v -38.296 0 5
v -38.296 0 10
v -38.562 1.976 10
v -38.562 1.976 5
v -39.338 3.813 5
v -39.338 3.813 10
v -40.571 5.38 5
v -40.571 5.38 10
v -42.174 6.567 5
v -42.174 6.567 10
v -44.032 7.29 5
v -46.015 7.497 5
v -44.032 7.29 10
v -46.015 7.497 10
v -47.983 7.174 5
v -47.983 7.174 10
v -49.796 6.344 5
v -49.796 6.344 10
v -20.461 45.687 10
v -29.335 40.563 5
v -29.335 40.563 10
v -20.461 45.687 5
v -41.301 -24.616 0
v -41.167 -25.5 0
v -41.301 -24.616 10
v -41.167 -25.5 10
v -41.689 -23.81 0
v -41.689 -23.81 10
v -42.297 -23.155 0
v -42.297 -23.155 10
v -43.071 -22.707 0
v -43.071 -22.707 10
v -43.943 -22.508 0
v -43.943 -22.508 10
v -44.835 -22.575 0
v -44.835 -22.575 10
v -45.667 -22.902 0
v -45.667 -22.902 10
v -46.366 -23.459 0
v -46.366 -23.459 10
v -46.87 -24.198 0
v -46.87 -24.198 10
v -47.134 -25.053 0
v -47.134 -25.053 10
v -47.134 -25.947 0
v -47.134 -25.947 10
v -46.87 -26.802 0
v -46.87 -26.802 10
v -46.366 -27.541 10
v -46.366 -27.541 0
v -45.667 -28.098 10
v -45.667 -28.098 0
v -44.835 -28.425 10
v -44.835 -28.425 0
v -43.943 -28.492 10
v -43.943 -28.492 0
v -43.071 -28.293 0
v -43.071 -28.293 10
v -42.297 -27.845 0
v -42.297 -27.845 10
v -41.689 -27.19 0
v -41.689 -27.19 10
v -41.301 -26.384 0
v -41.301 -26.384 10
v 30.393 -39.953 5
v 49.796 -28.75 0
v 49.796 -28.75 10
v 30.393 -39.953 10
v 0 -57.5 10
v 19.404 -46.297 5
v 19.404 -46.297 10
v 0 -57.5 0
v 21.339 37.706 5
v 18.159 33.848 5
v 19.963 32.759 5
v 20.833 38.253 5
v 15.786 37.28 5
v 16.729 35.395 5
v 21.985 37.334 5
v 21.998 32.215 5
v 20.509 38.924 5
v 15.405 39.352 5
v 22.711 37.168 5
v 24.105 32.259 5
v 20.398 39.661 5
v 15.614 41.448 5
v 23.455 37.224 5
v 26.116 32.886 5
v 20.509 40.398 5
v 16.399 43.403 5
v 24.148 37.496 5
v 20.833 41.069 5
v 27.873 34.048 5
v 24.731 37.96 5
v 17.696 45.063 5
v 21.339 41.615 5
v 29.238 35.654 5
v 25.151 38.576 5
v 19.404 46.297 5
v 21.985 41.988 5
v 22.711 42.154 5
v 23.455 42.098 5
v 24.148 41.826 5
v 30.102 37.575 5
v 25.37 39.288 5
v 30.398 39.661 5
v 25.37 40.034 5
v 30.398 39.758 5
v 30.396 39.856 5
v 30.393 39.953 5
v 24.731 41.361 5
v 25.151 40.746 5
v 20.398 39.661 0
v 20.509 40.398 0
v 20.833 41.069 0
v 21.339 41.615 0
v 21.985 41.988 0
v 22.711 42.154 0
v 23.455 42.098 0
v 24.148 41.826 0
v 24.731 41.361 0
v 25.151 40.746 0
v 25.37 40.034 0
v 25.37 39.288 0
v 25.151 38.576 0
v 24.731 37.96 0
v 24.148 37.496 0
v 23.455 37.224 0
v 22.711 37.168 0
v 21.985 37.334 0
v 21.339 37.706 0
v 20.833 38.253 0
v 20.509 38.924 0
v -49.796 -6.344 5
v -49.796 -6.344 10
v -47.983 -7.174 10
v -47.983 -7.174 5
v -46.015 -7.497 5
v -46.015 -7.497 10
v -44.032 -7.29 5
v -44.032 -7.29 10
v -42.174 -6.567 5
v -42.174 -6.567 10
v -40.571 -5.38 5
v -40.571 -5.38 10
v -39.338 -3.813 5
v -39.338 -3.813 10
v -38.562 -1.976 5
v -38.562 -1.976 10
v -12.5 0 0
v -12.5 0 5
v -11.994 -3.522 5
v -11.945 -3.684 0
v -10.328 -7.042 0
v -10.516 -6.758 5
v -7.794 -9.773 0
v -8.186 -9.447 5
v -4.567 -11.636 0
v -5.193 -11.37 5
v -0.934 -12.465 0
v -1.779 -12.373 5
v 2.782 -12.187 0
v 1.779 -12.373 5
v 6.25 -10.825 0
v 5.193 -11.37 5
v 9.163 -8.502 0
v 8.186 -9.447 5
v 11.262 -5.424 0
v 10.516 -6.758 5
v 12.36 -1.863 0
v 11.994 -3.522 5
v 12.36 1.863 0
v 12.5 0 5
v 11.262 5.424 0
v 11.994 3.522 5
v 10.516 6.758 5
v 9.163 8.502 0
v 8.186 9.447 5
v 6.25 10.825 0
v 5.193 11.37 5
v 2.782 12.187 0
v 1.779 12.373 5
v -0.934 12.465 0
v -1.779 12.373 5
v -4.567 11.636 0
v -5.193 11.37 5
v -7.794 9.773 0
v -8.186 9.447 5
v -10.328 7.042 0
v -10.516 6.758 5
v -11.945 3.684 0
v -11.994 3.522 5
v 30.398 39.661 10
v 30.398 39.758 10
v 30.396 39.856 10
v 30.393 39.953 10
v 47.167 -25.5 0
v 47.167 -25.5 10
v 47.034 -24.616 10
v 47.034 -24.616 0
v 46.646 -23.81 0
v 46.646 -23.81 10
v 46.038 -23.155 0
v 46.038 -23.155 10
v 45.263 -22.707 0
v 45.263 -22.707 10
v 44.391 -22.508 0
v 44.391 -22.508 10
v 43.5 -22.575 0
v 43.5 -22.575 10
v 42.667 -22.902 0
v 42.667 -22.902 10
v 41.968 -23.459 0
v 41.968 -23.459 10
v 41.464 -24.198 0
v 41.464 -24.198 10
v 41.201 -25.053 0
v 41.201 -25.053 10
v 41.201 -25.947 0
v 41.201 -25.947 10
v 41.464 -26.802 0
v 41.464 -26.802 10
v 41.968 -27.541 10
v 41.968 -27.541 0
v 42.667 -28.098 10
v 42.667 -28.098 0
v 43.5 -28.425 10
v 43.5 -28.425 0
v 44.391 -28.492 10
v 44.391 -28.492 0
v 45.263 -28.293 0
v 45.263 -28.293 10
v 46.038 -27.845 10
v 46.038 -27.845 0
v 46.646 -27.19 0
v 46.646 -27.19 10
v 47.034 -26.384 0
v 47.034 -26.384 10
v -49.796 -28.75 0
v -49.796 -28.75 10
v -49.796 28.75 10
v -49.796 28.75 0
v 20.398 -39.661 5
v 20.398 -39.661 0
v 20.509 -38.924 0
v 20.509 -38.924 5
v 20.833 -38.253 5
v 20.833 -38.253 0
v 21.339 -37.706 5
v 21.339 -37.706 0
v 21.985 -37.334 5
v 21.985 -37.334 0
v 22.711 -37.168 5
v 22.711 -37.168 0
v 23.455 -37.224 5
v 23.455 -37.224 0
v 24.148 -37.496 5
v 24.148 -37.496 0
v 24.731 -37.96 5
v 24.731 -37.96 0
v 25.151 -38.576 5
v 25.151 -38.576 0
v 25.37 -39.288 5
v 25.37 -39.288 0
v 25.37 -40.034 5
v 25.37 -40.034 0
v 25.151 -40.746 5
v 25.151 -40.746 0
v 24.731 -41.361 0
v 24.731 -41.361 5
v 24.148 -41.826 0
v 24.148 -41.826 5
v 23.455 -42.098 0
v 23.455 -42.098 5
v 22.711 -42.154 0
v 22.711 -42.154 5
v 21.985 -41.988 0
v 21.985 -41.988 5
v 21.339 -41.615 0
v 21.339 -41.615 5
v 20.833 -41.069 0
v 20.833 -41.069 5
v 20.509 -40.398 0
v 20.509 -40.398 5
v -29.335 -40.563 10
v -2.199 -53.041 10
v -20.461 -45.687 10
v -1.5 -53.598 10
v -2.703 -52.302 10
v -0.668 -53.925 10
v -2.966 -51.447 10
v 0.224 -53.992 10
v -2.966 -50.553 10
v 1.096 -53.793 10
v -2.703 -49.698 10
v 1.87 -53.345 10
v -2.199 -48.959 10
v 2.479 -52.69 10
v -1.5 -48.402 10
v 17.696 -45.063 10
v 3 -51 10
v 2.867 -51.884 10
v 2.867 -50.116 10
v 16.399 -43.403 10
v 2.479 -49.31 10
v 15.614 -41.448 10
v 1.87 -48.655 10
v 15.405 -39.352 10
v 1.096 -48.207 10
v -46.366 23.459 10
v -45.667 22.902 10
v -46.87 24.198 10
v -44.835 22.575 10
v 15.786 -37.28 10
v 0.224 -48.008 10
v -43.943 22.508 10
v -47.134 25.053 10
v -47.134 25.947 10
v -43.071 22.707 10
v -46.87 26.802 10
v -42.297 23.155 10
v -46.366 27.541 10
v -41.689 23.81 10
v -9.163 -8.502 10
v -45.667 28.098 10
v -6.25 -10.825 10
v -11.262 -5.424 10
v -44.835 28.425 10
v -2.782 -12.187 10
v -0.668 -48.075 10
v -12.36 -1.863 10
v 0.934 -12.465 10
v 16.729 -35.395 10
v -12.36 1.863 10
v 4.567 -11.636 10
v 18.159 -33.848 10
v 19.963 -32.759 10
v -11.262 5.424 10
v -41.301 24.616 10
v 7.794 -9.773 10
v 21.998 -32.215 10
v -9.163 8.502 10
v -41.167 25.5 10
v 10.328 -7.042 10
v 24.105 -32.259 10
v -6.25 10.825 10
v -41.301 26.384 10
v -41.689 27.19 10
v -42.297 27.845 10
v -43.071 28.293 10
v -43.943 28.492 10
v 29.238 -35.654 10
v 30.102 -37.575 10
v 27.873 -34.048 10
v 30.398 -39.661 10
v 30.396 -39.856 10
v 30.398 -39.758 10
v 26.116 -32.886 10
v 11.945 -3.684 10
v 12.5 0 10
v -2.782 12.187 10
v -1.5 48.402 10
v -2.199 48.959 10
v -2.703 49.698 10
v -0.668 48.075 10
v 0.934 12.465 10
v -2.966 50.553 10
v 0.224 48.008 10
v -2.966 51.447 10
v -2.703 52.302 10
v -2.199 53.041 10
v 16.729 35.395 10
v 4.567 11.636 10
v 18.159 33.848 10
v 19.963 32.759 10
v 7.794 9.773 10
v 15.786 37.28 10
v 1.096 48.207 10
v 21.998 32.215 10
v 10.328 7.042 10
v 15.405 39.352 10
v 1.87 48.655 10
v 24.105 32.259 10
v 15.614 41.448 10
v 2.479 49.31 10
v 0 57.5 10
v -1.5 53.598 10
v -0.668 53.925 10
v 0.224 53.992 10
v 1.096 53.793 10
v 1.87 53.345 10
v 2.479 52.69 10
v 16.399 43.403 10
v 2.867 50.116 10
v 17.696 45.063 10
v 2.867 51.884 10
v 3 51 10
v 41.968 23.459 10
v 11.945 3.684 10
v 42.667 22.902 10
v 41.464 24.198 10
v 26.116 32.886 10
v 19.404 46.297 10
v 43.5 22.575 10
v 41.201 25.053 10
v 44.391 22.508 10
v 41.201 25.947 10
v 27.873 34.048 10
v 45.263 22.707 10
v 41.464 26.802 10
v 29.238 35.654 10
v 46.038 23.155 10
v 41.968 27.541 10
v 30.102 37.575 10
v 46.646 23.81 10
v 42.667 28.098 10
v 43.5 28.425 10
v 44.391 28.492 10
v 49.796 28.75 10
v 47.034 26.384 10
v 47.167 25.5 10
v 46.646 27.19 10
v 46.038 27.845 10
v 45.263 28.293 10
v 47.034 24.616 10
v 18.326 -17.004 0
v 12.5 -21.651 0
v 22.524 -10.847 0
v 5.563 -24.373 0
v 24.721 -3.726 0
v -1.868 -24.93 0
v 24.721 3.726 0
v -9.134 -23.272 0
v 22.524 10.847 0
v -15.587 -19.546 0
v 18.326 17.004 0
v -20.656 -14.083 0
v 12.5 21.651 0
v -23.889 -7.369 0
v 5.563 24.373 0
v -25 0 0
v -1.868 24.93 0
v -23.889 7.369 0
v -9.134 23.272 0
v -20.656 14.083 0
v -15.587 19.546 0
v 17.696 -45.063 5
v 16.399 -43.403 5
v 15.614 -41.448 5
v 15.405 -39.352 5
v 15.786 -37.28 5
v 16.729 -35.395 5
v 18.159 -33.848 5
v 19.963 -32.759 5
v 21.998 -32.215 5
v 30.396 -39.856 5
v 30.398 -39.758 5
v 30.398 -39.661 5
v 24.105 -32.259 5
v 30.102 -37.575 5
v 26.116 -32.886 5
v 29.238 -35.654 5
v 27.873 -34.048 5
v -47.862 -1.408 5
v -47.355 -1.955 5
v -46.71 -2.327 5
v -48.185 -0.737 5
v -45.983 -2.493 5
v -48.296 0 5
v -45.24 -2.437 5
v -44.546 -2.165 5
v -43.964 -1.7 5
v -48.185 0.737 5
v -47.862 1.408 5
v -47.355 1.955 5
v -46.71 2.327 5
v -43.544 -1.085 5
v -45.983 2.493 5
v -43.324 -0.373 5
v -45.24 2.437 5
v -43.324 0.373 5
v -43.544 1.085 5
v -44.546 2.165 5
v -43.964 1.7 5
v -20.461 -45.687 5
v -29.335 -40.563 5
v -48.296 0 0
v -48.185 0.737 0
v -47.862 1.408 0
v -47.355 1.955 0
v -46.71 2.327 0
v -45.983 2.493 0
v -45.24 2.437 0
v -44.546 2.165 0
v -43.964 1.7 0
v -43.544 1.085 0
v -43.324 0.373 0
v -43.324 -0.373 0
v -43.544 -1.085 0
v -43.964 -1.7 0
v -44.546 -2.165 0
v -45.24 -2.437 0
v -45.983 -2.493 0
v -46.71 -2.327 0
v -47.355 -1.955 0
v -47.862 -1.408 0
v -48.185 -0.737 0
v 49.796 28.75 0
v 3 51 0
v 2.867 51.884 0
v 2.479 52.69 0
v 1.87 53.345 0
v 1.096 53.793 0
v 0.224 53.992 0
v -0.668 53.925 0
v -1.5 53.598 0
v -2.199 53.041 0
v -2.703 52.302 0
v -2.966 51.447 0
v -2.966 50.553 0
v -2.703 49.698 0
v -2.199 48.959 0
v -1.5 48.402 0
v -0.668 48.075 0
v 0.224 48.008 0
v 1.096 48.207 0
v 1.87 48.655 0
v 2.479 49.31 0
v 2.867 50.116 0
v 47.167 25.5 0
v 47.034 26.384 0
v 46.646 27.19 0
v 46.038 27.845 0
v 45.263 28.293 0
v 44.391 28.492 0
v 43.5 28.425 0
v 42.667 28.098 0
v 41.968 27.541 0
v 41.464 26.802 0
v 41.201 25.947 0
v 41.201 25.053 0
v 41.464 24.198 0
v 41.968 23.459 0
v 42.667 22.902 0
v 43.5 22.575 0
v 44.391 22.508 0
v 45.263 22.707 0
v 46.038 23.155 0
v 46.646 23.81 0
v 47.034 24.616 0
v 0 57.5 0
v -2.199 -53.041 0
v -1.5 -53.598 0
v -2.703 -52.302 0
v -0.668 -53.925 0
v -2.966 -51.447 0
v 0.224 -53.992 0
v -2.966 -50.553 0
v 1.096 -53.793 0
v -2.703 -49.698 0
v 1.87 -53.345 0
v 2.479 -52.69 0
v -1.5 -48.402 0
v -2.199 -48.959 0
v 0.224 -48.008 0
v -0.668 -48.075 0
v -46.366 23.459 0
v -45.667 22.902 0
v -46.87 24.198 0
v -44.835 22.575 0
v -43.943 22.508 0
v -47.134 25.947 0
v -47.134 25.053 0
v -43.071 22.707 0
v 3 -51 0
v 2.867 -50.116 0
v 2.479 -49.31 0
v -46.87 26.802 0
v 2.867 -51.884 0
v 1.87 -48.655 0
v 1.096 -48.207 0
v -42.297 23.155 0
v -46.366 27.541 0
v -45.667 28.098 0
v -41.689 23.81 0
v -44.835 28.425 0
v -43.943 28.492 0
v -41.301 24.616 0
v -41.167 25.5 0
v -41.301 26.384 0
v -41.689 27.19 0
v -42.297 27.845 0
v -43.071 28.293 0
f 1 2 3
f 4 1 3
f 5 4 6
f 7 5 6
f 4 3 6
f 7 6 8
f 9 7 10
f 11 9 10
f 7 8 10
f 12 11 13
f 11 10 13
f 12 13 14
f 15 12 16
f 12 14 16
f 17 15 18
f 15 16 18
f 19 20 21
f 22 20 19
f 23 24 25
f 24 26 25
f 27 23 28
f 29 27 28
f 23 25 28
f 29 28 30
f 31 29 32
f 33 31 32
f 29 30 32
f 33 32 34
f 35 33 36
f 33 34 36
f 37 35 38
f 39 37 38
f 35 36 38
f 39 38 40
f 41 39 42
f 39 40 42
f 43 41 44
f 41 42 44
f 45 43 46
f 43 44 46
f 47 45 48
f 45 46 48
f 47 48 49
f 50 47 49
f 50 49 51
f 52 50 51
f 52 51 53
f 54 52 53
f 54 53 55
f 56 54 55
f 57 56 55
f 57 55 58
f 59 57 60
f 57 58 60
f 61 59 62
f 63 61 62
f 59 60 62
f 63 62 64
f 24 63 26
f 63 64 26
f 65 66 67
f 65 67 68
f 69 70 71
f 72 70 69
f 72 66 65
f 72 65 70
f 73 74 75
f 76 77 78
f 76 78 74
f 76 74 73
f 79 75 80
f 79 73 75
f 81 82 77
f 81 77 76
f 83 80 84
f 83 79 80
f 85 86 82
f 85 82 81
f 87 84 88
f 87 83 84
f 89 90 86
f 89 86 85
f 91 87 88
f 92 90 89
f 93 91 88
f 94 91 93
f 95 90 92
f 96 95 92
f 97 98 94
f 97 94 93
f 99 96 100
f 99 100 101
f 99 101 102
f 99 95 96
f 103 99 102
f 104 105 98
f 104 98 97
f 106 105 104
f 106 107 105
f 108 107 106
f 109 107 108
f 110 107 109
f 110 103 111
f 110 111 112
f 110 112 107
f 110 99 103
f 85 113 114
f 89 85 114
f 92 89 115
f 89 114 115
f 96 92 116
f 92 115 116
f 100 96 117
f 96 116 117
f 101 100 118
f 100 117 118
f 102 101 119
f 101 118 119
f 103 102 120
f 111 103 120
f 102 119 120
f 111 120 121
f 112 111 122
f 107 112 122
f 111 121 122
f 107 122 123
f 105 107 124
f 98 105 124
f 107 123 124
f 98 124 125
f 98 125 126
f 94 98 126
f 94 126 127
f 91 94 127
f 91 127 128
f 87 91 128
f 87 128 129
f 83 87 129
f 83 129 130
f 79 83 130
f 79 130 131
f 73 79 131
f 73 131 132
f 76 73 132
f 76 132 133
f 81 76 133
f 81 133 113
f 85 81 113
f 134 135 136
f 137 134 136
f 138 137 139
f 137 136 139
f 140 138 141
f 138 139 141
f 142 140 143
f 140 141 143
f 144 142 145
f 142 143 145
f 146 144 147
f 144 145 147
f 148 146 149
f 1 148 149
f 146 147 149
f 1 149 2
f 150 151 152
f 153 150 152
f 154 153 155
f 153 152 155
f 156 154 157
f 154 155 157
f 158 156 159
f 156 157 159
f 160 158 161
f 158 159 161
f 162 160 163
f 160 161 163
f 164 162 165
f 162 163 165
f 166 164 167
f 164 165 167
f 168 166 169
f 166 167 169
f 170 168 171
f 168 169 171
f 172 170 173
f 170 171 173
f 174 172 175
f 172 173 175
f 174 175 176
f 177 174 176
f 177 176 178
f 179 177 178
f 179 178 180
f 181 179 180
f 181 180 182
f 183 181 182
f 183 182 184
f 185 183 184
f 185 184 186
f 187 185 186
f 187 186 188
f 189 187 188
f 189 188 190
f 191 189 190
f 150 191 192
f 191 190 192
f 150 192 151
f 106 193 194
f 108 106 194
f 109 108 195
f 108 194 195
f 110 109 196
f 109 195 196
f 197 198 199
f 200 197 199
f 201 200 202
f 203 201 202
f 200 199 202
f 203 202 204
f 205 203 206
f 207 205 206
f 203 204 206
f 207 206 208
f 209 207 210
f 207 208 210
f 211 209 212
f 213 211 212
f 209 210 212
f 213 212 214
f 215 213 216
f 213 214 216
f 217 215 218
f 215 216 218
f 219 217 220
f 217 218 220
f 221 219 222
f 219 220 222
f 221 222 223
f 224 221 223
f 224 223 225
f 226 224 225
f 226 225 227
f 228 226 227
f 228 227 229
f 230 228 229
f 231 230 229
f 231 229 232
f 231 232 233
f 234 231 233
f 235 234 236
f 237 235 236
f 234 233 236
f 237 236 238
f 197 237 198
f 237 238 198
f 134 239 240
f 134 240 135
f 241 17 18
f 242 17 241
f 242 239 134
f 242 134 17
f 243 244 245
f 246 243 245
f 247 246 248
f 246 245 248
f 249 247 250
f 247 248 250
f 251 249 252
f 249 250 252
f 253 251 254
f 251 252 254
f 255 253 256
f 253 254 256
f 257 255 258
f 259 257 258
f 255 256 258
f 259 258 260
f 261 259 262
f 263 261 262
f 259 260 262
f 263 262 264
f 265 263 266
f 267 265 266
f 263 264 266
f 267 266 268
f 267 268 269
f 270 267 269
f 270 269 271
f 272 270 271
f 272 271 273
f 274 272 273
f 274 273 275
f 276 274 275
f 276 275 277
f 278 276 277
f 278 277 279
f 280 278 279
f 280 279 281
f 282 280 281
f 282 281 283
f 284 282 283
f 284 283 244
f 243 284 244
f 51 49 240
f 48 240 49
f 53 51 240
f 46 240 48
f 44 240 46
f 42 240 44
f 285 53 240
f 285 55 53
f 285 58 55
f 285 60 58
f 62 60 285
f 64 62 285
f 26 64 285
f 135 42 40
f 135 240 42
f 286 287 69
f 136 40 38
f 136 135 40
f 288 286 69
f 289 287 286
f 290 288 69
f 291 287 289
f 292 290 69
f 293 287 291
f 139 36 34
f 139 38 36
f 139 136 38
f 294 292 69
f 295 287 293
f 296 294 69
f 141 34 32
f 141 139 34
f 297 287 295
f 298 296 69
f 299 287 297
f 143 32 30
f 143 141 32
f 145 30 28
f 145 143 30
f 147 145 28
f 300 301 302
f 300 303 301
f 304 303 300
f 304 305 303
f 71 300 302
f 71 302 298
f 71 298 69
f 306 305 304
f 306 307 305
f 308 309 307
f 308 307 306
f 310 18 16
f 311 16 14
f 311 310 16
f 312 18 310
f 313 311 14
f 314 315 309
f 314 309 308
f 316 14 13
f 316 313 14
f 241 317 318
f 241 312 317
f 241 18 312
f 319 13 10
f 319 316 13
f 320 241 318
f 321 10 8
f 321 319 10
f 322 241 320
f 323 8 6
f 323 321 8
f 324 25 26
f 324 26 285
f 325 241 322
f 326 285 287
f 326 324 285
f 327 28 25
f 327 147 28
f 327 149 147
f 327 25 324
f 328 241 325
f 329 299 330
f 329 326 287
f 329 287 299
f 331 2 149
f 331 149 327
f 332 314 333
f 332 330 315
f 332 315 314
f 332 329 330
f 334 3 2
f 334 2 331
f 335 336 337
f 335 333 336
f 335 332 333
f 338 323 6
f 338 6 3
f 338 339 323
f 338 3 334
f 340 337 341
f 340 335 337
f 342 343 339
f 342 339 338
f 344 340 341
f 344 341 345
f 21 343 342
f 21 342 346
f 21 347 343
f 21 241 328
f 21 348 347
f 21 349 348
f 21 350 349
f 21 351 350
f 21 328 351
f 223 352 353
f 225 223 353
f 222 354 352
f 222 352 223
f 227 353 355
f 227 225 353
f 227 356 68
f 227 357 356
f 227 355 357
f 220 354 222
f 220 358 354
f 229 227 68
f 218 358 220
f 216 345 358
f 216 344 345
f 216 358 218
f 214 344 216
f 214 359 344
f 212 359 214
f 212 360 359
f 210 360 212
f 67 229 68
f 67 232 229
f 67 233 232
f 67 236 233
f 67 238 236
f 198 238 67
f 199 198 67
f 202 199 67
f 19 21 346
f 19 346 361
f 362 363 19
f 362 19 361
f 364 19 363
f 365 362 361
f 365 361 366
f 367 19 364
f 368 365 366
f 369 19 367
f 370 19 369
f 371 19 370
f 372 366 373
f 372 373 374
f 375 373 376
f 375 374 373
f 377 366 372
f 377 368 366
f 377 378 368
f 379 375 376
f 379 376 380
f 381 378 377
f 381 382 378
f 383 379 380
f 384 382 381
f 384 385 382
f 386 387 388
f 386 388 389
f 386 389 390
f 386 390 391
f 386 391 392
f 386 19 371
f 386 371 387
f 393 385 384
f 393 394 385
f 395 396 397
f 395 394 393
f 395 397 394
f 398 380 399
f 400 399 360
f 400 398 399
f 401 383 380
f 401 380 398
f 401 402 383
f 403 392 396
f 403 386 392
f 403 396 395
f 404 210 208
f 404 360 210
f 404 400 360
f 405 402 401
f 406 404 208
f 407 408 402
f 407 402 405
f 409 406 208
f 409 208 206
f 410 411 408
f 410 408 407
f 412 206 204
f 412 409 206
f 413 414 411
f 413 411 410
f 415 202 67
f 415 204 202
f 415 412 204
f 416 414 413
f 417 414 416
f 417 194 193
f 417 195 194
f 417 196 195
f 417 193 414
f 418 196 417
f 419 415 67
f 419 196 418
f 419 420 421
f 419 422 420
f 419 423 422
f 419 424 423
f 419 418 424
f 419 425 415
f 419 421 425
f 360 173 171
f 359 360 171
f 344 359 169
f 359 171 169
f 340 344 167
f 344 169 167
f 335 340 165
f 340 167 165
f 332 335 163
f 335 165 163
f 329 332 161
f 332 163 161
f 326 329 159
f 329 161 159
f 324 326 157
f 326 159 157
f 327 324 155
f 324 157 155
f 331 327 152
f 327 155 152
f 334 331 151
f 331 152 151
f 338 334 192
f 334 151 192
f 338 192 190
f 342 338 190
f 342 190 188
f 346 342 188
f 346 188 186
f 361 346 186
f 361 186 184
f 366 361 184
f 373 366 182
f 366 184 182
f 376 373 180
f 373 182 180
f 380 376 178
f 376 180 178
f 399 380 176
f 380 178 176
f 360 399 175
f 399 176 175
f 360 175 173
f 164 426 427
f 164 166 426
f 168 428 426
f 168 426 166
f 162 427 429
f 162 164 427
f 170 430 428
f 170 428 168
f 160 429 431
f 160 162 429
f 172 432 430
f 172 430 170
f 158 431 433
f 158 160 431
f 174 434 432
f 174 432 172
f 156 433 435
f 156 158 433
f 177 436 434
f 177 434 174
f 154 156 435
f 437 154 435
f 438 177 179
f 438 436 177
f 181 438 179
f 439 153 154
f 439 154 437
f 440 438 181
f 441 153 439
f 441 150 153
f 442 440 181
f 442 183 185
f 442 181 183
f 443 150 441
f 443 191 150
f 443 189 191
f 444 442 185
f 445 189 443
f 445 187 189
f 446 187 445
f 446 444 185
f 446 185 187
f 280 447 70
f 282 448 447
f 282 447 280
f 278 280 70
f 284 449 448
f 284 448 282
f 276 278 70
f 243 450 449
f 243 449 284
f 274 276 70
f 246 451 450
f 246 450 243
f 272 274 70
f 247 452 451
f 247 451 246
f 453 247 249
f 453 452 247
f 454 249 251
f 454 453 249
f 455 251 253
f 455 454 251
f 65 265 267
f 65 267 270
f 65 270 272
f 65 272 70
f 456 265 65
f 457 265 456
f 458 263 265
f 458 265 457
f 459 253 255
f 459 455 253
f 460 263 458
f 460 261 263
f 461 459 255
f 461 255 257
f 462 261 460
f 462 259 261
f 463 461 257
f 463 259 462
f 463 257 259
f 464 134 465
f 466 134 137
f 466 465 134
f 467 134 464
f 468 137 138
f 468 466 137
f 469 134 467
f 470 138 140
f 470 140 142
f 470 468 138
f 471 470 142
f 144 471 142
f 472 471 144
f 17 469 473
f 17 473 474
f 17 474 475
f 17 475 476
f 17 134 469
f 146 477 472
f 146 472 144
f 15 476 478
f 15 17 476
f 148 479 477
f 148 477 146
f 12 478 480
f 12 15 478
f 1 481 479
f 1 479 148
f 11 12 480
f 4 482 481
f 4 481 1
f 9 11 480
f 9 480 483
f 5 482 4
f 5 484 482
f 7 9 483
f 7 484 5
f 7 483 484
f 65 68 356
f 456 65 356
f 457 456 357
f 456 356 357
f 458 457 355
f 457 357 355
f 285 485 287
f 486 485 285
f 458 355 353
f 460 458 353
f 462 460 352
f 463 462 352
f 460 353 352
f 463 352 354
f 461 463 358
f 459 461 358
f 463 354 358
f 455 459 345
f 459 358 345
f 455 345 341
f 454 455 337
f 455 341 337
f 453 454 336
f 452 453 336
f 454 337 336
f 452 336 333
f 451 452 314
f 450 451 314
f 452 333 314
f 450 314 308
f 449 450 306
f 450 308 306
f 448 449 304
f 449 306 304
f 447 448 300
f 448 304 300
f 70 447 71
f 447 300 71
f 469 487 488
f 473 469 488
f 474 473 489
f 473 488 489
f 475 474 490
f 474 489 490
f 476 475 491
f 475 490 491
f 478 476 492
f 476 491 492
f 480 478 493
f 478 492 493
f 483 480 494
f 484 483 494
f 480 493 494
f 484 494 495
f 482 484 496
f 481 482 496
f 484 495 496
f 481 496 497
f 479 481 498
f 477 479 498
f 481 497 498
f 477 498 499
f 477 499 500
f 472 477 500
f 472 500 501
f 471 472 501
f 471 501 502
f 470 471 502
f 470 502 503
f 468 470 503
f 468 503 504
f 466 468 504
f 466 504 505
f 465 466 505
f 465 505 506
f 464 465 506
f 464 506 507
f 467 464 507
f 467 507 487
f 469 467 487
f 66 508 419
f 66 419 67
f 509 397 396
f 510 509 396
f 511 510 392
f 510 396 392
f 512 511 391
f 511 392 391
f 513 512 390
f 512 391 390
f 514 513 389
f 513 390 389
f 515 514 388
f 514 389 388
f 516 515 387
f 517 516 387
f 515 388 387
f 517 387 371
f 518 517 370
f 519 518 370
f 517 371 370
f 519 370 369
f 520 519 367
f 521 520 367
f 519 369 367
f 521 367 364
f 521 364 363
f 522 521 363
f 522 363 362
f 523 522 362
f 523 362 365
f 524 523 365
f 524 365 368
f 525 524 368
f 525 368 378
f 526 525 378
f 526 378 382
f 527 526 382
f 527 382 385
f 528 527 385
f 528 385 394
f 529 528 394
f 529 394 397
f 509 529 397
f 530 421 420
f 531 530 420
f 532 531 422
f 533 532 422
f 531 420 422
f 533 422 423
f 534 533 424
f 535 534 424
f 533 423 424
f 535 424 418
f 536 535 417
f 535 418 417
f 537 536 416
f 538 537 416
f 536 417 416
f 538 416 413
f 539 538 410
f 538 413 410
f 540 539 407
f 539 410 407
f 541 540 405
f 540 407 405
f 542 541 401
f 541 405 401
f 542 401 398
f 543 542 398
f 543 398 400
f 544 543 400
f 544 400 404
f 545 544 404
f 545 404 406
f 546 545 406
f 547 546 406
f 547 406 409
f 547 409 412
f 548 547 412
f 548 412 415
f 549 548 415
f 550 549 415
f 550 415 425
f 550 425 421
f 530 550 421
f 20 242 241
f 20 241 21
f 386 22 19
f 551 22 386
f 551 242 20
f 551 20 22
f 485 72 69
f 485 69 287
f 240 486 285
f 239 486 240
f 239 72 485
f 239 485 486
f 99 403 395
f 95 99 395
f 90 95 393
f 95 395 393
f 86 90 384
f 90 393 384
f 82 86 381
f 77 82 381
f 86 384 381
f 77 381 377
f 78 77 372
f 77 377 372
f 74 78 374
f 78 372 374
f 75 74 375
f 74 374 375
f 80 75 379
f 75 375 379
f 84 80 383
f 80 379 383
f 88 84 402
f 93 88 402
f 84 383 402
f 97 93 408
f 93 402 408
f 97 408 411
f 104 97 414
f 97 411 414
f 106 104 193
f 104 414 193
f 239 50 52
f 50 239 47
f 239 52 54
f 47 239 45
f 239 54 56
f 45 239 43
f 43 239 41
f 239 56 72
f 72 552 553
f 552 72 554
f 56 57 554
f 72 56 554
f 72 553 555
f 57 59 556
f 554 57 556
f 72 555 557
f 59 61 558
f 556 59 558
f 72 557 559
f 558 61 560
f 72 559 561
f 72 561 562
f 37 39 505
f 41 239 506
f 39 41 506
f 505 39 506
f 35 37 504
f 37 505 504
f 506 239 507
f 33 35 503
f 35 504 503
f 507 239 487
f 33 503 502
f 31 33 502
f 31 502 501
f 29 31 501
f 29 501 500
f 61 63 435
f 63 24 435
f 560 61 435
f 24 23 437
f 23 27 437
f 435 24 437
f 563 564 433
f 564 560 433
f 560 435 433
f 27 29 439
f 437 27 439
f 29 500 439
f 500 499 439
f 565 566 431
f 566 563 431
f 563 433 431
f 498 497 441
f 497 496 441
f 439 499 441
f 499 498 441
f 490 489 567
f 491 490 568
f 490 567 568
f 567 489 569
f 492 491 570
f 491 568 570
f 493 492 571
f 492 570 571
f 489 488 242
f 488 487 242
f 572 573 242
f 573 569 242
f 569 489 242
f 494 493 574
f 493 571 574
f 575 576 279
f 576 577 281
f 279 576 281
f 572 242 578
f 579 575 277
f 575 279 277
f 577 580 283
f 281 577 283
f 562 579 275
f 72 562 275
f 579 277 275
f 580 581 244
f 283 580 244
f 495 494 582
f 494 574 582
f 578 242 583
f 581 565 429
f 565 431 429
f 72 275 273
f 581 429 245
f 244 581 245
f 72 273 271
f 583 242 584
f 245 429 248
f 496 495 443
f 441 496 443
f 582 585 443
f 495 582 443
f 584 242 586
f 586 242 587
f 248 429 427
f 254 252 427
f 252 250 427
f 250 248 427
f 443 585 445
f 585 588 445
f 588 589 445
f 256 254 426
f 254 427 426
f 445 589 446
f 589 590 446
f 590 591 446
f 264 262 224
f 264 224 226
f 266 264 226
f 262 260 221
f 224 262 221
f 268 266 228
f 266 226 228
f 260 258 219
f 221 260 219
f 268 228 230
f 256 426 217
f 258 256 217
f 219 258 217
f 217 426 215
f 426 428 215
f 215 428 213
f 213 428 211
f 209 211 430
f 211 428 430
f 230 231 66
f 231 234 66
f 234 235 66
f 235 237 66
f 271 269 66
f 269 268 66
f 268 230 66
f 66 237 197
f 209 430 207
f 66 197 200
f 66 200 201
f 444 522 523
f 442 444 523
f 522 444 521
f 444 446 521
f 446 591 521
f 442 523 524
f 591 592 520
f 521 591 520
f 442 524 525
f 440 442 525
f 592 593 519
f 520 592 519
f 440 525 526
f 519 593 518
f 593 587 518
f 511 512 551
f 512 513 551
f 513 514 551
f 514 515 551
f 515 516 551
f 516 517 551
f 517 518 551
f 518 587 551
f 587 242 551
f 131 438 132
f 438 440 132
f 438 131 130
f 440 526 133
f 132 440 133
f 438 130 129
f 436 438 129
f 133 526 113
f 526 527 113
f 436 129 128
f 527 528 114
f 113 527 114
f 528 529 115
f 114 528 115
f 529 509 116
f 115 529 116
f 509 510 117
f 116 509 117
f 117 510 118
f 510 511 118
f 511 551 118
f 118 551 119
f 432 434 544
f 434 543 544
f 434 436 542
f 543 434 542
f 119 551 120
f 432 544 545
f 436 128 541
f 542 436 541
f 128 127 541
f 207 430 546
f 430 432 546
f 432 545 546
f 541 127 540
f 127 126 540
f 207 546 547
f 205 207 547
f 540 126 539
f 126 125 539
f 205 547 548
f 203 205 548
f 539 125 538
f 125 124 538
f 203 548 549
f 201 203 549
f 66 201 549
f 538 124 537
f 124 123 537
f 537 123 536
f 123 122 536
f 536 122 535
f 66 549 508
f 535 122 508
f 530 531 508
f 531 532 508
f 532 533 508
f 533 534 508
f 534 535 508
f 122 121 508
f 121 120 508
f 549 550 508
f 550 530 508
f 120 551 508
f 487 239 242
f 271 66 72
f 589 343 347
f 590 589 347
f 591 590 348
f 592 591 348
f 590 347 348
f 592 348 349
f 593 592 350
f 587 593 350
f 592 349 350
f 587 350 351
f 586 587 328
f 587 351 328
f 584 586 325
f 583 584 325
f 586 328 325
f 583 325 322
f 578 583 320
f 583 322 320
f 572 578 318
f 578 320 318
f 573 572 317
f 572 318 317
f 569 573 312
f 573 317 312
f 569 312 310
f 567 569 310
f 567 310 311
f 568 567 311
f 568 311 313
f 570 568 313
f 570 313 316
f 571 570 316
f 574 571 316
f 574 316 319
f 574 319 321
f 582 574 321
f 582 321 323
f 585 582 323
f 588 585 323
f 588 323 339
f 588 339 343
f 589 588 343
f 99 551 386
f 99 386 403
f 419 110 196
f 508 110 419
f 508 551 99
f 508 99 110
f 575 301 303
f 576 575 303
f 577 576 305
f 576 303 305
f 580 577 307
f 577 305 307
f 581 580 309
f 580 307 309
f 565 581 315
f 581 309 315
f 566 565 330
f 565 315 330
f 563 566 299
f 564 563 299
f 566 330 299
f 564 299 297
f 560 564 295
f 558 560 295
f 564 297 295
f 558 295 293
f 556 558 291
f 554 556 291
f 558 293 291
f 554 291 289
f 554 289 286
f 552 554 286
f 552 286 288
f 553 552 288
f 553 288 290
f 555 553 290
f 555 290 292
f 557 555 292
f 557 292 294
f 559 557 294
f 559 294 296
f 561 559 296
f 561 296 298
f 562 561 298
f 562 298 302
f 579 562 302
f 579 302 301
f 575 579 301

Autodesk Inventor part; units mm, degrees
ref_plane "YZ Plane" through (0, 0, 0) normal (1, 0, 0) x (0, 1, 0)
ref_plane "XZ Plane" through (0, 0, 0) normal (0, 1, 0) x (-1, 0, 0)
ref_plane "XY Plane" through (0, 0, 0) normal (0, 0, 1) x (1, 0, 0)
sketch "Sketch1" plane through (0, 0, 0) normal (0, 0, 1) x (1, 0, 0)
  circle A0 centre (0, 0) radius 12.5
  circle A1 centre (-30, 0) radius 3
  circle A2 centre (-15, -25.9808) radius 3
  circle A3 centre (15, -25.9808) radius 3
  circle A4 centre (30, 0) radius 3
  circle A5 centre (15, 25.9808) radius 3
  circle A6 centre (-15, 25.9808) radius 3
  line L0 (0, 57.5) -> (49.7965, 28.75)
  line L1 (49.7965, 28.75) -> (49.7965, -28.75)
  line L2 (49.7965, -28.75) -> (0, -57.5)
  line L3 (0, -57.5) -> (-49.7965, -28.75)
  line L4 (-49.7965, -28.75) -> (-49.7965, 28.75)
  line L5 (-49.7965, 28.75) -> (0, 57.5)
  point P0 (49.7965, 0)
  dimension "d0" = 25
  dimension "d2" = 6
  dimension "d6" = 360
  dimension "d15" = 30
  dimension "d33" = 115
extrude "Extrusion1" add sketch "Sketch1" along normal blind 10 contours A1 | A2 | A3 | A4 | A5 | A6 | L0 L1 L2 L3 L4 L5
sketch "Sketch7" plane through (0, 0, 10) normal (0, 0, 1) x (1, 0, 0)
  circle A0 centre (0, 51) radius 3
  circle A1 centre (-44.1673, 25.5) radius 3
  circle A2 centre (-44.1673, -25.5) radius 3
  circle A3 centre (0, -51) radius 3
  circle A4 centre (44.1673, -25.5) radius 3
  circle A5 centre (44.1673, 25.5) radius 3
  line L0 (0, 51) -> (0, -51)
  point P0 (0, 0)
  dimension "d42" = 6
  dimension "d46" = 360
  dimension "d96" = 102
extrude "Extrusion6" cut sketch "Sketch7" against normal through all
sketch "Sketch9" plane through (0, 0, 0) normal (0, 0, -1) x (-1, 0, 0)
  circle A0 centre (0, 0) radius 25
  dimension "d56" = 50
extrude "Extrusion8" cut sketch "Sketch9" against normal blind 5
sketch "Sketch14" plane through (0, 0, 10) normal (0, 0, 1) x (1, 0, 0)
  circle A0 centre (-45.7965, 0) radius 2.5
  circle A1 centre (-22.8982, -39.6609) radius 2.5
  circle A2 centre (22.8982, -39.6609) radius 2.5
  circle A3 centre (45.7965, 0) radius 2.5
  circle A4 centre (22.8982, 39.6609) radius 2.5
  circle A5 centre (-22.8982, 39.6609) radius 2.5
  line L0 (-49.7965, 28.75) -> (-49.7965, -28.75) projected
  point P0 (0, 0)
  point P1 (-45.7965, 0)
  dimension "d81" = 5
  dimension "d85" = 360
  dimension "d97" = 4
extrude "Extrusion13" cut sketch "Sketch14" against normal through all
sketch "Sketch15" plane through (0, 0, 10) normal (0, 0, 1) x (1, 0, 0)
  circle A0 centre (-22.8982, 39.6609) radius 2.5 projected
  circle A1 centre (-22.8982, 39.6609) radius 6.5
  circle A2 centre (-45.7965, 0) radius 6.5
  circle A3 centre (-22.8982, -39.6609) radius 6.5
  circle A4 centre (22.8982, -39.6609) radius 6.5
  circle A5 centre (45.7965, 0) radius 6.5
  circle A6 centre (22.8982, 39.6609) radius 6.5
  point P0 (0, 0)
  dimension "d89" = 13
  dimension "d92" = 360
extrude "Extrusion14" cut sketch "Sketch15" against normal blind 5 contours A0 | A1 | A2 | A3 | A4 | A5 | A6
sketch "Sketch16" plane through (0, 0, 5) normal (0, 0, 1) x (1, 0, 0)
  line L0 (-29.3353, 40.5633) -> (-20.4612, 45.6867) projected
  arc A0 (-29.3353, 40.5633) -> (-20.4612, 45.6867) centre (-22.8982, 39.6609) ccw projected
  circle A1 centre (-22.8982, 39.6609) radius 2.5 projected
  line L1 (49.7965, 5.1235) -> (49.7965, -5.1235) projected
  arc A2 (49.7965, 5.1235) -> (49.7965, -5.1235) centre (45.7965, 0) ccw projected
  circle A3 centre (45.7965, 0) radius 2.5 projected
  line L2 (-20.4612, -45.6867) -> (-29.3353, -40.5633) projected
  arc A4 (-20.4612, -45.6867) -> (-29.3353, -40.5633) centre (-22.8982, -39.6609) ccw projected
  circle A5 centre (-22.8982, -39.6609) radius 2.5 projected
  point P0 (0, 0)
extrude "Extrusion15" add sketch "Sketch16" along normal blind 5
sketch "Sketch17" plane through (0, 0, 10) normal (0, 0, 1) x (1, 0, 0)
  circle A0 centre (-22.8982, 39.6609) radius 2.5 projected
  circle A1 centre (45.7965, 0) radius 2.5 projected
  circle A2 centre (-22.8982, -39.6609) radius 2.5 projected
  point P0 (0, 0)
extrude "Extrusion16" add sketch "Sketch17" against normal blind 10
sketch "Sketch18" plane through (0, 0, 5) normal (0, 0, -1) x (-1, 0, 0)
  circle A0 centre (0, 0) radius 12.5 projected
  circle A1 centre (0, 0) radius 25 projected
extrude "Extrusion17" add sketch "Sketch18" along normal blind 5
sketch "Sketch19" plane through (0, 0, 5) normal (0, 0, 1) x (1, 0, 0)
  line L0 (-49.7965, -5.1235) -> (-49.7965, 5.1235) projected
  arc A0 (-49.7965, -5.1235) -> (-49.7965, 5.1235) centre (-45.7965, 0) ccw projected
  circle A1 centre (-45.7965, 0) radius 2.5 projected
  line L1 (20.4612, 45.6867) -> (29.3353, 40.5633) projected
  arc A2 (20.4612, 45.6867) -> (29.3353, 40.5633) centre (22.8982, 39.6609) ccw projected
  circle A3 centre (22.8982, 39.6609) radius 2.5 projected
  line L2 (29.3353, -40.5633) -> (20.4612, -45.6867) projected
  arc A4 (29.3353, -40.5633) -> (20.4612, -45.6867) centre (22.8982, -39.6609) ccw projected
  circle A5 centre (22.8982, -39.6609) radius 2.5 projected
  point P0 (0, 0)
extrude "Extrusion18" add sketch "Sketch19" along normal blind 5 contours L0 A0 | A1 | L1 A2 | A3 | L2 A4 | A5
sketch "Sketch20" plane through (22.8982, 39.6609, 5) normal (0, 0, -1) x (-1, 0, 0)
  circle A0 centre (0, 0) radius 2.5 projected
  circle A1 centre (0, -79.3218) radius 2.5 projected
  circle A2 centre (68.6947, -39.6609) radius 2.5 projected
  point P0 (22.8982, -39.6609)
extrude "Extrusion19" add sketch "Sketch20" along normal blind 5
sketch "Sketch24" plane through (0, 0, 0) normal (0, 0, -1) x (-1, 0, 0)
  circle A0 centre (-22.8982, -39.6609) radius 2.5
  line L0 (-22.8982, -39.6609) -> (-24.8982, -43.125) construction
  line L1 (-49.7965, -28.75) -> (0, -57.5) projected
  circle A1 centre (22.8982, -39.6609) radius 2.5
  line L2 (22.8982, -39.6609) -> (24.8982, -43.125) construction
  circle A2 centre (45.7965, 0) radius 2.5
  line L3 (45.7965, 0) -> (49.7965, 0) construction
  circle A3 centre (22.8982, 39.6609) radius 2.5
  line L4 (22.8982, 39.6609) -> (24.8982, 43.125) construction
  circle A4 centre (-22.8982, 39.6609) radius 2.5
  line L5 (-22.8982, 39.6609) -> (-24.8982, 43.125) construction
  circle A5 centre (-45.7965, 0) radius 2.5
  line L6 (-45.7965, 0) -> (-49.7965, 0) construction
  point P0 (0, 0)
  dimension "d130" = 5
  dimension "d131" = 4
  dimension "d134" = 360
extrude "Extrusion22" cut sketch "Sketch24" against normal through all contours A0 | A2 | A4
sketch "Sketch26" plane through (0, 0, 10) normal (0, 0, 1) x (1, 0, 0)
  circle A0 centre (-45.7965, 0) radius 2.5 projected
  circle A1 centre (-45.7965, 0) radius 7.5
  circle A2 centre (22.8982, -39.6609) radius 7.5
  circle A3 centre (22.8982, 39.6609) radius 7.5
  point P0 (0, 0)
  dimension "d141" = 15
  dimension "d147" = 360
extrude "Extrusion23" cut sketch "Sketch26" against normal blind 5 contours A0 | A1 | A2 | A3
properties part number "TA01" material "ABS Plastic"
